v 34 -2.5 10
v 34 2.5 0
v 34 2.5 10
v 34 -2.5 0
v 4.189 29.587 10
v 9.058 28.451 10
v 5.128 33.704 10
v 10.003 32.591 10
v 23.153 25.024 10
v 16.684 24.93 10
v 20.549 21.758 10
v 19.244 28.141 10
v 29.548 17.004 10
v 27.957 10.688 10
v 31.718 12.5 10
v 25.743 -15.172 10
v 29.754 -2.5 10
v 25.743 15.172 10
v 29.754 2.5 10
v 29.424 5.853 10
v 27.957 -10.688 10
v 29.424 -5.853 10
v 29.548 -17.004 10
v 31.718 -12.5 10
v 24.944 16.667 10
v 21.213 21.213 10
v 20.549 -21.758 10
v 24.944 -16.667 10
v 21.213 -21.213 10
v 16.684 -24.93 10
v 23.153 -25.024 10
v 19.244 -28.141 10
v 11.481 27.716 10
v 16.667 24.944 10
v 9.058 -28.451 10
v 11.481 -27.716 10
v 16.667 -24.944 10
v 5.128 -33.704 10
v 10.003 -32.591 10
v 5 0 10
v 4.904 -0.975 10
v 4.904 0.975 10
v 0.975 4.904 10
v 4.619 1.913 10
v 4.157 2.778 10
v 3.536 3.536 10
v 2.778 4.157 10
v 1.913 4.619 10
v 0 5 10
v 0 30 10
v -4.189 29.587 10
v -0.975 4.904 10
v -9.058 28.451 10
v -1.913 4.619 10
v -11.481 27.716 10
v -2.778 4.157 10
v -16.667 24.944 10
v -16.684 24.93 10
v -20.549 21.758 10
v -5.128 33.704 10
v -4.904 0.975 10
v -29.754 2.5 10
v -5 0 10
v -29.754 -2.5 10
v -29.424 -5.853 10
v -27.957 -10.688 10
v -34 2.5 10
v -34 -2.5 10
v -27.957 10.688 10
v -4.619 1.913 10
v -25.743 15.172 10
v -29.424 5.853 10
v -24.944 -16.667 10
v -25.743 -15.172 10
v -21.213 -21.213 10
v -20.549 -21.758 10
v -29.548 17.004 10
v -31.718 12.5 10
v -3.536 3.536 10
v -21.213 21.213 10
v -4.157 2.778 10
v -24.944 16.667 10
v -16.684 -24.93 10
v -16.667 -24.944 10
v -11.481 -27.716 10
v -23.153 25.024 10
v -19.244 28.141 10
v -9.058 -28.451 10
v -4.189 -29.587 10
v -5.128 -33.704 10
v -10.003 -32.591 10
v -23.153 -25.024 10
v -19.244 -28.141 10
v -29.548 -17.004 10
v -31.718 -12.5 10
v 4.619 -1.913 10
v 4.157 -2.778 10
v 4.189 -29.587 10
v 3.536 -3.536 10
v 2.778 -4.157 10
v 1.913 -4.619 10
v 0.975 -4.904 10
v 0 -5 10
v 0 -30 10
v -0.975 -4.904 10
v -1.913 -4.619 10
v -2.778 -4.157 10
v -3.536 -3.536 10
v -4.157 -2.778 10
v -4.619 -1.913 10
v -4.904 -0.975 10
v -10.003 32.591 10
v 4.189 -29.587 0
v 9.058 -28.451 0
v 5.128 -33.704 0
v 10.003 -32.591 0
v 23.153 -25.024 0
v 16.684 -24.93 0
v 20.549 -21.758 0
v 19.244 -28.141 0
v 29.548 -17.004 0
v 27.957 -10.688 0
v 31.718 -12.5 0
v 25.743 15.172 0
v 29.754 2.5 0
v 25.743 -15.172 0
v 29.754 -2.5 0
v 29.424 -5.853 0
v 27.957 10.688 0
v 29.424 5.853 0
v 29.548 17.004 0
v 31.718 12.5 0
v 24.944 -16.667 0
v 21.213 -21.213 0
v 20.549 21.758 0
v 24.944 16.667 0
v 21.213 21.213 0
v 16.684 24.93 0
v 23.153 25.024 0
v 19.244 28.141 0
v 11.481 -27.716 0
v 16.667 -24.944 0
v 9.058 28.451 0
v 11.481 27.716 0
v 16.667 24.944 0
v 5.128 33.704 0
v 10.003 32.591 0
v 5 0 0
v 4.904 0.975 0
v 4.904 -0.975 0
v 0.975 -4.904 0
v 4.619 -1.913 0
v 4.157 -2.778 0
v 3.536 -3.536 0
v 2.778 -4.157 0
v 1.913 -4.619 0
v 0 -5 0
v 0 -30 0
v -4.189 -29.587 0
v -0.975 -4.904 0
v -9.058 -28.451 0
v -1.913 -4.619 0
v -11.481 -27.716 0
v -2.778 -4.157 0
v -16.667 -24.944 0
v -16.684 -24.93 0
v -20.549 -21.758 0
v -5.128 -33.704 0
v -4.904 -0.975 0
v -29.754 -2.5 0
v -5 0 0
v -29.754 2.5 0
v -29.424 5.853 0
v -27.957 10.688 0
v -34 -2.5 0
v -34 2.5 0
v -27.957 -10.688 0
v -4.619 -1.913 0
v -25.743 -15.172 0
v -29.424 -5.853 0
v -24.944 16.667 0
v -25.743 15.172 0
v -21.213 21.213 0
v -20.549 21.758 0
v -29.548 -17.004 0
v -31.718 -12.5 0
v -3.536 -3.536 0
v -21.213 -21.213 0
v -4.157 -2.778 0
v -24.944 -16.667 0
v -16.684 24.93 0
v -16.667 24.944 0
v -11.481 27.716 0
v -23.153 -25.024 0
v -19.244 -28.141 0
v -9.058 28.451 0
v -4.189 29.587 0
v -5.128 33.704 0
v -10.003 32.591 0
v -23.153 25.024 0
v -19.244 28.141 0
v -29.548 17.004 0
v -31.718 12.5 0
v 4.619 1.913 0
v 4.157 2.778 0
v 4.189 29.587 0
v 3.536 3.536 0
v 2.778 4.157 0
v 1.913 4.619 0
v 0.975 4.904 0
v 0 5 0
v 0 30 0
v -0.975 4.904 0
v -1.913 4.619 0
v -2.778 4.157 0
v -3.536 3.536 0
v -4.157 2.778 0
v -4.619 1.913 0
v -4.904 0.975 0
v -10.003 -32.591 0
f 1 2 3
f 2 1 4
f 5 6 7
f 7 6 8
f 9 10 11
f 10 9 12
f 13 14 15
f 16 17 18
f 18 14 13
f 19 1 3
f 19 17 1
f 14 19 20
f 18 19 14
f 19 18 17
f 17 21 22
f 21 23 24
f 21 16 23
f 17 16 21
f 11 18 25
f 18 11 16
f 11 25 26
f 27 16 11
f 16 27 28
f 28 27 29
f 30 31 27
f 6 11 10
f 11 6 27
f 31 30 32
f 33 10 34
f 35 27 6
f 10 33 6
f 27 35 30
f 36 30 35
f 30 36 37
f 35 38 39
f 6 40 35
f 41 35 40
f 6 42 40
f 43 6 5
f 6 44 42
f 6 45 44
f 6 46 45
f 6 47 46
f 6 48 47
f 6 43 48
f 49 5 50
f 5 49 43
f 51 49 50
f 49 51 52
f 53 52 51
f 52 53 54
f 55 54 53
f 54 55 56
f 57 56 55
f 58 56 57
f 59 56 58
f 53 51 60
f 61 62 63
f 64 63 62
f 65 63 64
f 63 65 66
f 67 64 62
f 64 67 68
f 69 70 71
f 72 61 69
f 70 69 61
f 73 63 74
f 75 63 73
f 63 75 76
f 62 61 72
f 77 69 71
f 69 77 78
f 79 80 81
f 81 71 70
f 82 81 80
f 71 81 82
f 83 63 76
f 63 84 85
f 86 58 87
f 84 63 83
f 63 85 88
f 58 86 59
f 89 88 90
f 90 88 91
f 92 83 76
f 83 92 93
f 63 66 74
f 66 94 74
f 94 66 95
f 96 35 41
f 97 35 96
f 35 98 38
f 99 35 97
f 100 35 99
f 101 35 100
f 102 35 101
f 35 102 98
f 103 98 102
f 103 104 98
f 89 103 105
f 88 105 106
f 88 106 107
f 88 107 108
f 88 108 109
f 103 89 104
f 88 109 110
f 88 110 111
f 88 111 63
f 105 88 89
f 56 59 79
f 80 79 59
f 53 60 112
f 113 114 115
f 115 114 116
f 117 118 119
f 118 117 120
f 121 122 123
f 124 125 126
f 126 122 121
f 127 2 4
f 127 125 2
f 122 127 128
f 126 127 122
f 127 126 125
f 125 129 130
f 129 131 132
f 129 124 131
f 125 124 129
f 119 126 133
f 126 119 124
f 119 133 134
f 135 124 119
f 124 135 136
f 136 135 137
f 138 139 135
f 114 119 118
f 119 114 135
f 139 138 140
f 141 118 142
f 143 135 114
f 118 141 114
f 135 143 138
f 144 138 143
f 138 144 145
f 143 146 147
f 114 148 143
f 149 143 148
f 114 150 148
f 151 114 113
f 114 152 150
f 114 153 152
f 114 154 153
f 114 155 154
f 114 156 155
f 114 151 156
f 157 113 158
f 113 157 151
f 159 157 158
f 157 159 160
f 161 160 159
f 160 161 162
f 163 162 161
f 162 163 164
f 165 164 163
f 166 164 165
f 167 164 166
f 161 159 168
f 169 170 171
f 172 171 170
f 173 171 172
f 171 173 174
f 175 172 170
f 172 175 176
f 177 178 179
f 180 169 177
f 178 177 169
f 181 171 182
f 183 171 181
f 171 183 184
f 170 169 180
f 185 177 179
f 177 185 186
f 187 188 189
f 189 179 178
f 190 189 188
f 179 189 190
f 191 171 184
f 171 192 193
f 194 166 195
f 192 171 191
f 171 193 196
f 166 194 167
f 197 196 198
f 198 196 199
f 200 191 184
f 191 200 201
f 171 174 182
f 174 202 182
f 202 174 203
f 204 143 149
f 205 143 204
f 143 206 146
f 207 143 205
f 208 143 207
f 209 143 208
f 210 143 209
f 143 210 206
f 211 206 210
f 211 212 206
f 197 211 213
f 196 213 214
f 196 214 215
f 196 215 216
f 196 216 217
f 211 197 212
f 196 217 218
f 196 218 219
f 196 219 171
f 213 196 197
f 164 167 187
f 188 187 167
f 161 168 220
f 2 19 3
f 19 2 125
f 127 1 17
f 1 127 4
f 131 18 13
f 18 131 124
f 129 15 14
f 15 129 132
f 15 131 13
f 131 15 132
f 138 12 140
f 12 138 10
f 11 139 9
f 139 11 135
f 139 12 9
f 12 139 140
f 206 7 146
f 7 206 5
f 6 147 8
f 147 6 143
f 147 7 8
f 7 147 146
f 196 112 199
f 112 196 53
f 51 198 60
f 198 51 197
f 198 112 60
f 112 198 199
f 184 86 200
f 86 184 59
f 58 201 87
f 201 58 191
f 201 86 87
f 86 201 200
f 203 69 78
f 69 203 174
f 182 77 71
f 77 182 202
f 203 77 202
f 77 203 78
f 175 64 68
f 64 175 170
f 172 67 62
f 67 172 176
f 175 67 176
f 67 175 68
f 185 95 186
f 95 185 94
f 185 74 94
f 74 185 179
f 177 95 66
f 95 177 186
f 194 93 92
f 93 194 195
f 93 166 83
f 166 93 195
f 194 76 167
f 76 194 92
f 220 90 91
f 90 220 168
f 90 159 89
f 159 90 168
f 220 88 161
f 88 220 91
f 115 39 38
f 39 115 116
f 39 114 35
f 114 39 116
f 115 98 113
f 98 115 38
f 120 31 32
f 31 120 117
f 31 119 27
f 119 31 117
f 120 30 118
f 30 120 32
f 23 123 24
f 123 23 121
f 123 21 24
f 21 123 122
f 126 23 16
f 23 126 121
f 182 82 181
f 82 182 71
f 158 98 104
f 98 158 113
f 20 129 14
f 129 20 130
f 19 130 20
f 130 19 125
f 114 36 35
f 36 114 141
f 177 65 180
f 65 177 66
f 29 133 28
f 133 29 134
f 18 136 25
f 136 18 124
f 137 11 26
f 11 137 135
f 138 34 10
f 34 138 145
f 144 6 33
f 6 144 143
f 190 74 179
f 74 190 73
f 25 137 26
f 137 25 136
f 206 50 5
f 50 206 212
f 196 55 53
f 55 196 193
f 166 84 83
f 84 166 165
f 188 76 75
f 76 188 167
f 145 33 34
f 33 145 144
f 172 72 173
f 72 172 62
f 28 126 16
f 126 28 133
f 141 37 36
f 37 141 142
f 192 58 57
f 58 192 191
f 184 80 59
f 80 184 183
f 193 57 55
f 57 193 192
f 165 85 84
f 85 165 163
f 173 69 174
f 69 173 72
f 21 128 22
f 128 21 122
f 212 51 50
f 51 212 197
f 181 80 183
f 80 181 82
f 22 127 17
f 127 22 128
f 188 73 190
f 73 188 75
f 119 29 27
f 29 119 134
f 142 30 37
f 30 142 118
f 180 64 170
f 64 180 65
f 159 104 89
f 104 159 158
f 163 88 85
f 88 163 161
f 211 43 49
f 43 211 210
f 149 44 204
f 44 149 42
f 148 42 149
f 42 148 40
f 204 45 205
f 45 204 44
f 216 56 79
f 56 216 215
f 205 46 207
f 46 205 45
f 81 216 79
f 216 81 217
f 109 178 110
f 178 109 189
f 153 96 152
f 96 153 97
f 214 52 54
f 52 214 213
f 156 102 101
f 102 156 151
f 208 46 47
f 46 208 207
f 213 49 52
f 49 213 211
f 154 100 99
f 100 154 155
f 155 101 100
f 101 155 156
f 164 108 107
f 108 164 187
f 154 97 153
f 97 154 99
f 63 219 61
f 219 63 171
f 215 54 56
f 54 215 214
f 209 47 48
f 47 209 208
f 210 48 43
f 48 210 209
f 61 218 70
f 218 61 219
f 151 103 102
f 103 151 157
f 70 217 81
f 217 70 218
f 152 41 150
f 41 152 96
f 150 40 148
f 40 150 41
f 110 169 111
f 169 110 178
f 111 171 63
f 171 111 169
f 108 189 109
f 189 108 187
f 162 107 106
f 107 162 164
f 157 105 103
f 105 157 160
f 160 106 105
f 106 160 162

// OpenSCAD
$fn = 32;

// ----------------------------------------------------------------------
// Spur blank: bored gear blank
// ----------------------------------------------------------------------

// --- parameters (mm) ---
disc_r = 30;              // blank root radius
disc_t = 10;              // blank thickness
n_teeth = 14;             // stub tooth count
tooth_w = 5;              // tooth width at the root
tooth_h = 4;              // tooth height above the root
bore_r = 5;               // central bore radius
fit_tol = 0.1;            // tolerance for press fits, mm
free_tol = 0.5;           // tolerance for clearance fits, mm

out_r = disc_r + tooth_h;  // tip radius
bbox_x = 68.0;  // measured width over the teeth
bbox_y = 67.41;  // measured depth over the teeth

difference() {
union() {
  cylinder(r = disc_r, h = disc_t);
  for (i = [0 : n_teeth - 1])
    rotate([0, 0, i * 360 / n_teeth])
      translate([disc_r - 1, -tooth_w / 2, 0])
        cube([tooth_h + 1, tooth_w, disc_t]);
}
  translate([0, 0, -1]) cylinder(r = bore_r, h = disc_t + 2);
}
